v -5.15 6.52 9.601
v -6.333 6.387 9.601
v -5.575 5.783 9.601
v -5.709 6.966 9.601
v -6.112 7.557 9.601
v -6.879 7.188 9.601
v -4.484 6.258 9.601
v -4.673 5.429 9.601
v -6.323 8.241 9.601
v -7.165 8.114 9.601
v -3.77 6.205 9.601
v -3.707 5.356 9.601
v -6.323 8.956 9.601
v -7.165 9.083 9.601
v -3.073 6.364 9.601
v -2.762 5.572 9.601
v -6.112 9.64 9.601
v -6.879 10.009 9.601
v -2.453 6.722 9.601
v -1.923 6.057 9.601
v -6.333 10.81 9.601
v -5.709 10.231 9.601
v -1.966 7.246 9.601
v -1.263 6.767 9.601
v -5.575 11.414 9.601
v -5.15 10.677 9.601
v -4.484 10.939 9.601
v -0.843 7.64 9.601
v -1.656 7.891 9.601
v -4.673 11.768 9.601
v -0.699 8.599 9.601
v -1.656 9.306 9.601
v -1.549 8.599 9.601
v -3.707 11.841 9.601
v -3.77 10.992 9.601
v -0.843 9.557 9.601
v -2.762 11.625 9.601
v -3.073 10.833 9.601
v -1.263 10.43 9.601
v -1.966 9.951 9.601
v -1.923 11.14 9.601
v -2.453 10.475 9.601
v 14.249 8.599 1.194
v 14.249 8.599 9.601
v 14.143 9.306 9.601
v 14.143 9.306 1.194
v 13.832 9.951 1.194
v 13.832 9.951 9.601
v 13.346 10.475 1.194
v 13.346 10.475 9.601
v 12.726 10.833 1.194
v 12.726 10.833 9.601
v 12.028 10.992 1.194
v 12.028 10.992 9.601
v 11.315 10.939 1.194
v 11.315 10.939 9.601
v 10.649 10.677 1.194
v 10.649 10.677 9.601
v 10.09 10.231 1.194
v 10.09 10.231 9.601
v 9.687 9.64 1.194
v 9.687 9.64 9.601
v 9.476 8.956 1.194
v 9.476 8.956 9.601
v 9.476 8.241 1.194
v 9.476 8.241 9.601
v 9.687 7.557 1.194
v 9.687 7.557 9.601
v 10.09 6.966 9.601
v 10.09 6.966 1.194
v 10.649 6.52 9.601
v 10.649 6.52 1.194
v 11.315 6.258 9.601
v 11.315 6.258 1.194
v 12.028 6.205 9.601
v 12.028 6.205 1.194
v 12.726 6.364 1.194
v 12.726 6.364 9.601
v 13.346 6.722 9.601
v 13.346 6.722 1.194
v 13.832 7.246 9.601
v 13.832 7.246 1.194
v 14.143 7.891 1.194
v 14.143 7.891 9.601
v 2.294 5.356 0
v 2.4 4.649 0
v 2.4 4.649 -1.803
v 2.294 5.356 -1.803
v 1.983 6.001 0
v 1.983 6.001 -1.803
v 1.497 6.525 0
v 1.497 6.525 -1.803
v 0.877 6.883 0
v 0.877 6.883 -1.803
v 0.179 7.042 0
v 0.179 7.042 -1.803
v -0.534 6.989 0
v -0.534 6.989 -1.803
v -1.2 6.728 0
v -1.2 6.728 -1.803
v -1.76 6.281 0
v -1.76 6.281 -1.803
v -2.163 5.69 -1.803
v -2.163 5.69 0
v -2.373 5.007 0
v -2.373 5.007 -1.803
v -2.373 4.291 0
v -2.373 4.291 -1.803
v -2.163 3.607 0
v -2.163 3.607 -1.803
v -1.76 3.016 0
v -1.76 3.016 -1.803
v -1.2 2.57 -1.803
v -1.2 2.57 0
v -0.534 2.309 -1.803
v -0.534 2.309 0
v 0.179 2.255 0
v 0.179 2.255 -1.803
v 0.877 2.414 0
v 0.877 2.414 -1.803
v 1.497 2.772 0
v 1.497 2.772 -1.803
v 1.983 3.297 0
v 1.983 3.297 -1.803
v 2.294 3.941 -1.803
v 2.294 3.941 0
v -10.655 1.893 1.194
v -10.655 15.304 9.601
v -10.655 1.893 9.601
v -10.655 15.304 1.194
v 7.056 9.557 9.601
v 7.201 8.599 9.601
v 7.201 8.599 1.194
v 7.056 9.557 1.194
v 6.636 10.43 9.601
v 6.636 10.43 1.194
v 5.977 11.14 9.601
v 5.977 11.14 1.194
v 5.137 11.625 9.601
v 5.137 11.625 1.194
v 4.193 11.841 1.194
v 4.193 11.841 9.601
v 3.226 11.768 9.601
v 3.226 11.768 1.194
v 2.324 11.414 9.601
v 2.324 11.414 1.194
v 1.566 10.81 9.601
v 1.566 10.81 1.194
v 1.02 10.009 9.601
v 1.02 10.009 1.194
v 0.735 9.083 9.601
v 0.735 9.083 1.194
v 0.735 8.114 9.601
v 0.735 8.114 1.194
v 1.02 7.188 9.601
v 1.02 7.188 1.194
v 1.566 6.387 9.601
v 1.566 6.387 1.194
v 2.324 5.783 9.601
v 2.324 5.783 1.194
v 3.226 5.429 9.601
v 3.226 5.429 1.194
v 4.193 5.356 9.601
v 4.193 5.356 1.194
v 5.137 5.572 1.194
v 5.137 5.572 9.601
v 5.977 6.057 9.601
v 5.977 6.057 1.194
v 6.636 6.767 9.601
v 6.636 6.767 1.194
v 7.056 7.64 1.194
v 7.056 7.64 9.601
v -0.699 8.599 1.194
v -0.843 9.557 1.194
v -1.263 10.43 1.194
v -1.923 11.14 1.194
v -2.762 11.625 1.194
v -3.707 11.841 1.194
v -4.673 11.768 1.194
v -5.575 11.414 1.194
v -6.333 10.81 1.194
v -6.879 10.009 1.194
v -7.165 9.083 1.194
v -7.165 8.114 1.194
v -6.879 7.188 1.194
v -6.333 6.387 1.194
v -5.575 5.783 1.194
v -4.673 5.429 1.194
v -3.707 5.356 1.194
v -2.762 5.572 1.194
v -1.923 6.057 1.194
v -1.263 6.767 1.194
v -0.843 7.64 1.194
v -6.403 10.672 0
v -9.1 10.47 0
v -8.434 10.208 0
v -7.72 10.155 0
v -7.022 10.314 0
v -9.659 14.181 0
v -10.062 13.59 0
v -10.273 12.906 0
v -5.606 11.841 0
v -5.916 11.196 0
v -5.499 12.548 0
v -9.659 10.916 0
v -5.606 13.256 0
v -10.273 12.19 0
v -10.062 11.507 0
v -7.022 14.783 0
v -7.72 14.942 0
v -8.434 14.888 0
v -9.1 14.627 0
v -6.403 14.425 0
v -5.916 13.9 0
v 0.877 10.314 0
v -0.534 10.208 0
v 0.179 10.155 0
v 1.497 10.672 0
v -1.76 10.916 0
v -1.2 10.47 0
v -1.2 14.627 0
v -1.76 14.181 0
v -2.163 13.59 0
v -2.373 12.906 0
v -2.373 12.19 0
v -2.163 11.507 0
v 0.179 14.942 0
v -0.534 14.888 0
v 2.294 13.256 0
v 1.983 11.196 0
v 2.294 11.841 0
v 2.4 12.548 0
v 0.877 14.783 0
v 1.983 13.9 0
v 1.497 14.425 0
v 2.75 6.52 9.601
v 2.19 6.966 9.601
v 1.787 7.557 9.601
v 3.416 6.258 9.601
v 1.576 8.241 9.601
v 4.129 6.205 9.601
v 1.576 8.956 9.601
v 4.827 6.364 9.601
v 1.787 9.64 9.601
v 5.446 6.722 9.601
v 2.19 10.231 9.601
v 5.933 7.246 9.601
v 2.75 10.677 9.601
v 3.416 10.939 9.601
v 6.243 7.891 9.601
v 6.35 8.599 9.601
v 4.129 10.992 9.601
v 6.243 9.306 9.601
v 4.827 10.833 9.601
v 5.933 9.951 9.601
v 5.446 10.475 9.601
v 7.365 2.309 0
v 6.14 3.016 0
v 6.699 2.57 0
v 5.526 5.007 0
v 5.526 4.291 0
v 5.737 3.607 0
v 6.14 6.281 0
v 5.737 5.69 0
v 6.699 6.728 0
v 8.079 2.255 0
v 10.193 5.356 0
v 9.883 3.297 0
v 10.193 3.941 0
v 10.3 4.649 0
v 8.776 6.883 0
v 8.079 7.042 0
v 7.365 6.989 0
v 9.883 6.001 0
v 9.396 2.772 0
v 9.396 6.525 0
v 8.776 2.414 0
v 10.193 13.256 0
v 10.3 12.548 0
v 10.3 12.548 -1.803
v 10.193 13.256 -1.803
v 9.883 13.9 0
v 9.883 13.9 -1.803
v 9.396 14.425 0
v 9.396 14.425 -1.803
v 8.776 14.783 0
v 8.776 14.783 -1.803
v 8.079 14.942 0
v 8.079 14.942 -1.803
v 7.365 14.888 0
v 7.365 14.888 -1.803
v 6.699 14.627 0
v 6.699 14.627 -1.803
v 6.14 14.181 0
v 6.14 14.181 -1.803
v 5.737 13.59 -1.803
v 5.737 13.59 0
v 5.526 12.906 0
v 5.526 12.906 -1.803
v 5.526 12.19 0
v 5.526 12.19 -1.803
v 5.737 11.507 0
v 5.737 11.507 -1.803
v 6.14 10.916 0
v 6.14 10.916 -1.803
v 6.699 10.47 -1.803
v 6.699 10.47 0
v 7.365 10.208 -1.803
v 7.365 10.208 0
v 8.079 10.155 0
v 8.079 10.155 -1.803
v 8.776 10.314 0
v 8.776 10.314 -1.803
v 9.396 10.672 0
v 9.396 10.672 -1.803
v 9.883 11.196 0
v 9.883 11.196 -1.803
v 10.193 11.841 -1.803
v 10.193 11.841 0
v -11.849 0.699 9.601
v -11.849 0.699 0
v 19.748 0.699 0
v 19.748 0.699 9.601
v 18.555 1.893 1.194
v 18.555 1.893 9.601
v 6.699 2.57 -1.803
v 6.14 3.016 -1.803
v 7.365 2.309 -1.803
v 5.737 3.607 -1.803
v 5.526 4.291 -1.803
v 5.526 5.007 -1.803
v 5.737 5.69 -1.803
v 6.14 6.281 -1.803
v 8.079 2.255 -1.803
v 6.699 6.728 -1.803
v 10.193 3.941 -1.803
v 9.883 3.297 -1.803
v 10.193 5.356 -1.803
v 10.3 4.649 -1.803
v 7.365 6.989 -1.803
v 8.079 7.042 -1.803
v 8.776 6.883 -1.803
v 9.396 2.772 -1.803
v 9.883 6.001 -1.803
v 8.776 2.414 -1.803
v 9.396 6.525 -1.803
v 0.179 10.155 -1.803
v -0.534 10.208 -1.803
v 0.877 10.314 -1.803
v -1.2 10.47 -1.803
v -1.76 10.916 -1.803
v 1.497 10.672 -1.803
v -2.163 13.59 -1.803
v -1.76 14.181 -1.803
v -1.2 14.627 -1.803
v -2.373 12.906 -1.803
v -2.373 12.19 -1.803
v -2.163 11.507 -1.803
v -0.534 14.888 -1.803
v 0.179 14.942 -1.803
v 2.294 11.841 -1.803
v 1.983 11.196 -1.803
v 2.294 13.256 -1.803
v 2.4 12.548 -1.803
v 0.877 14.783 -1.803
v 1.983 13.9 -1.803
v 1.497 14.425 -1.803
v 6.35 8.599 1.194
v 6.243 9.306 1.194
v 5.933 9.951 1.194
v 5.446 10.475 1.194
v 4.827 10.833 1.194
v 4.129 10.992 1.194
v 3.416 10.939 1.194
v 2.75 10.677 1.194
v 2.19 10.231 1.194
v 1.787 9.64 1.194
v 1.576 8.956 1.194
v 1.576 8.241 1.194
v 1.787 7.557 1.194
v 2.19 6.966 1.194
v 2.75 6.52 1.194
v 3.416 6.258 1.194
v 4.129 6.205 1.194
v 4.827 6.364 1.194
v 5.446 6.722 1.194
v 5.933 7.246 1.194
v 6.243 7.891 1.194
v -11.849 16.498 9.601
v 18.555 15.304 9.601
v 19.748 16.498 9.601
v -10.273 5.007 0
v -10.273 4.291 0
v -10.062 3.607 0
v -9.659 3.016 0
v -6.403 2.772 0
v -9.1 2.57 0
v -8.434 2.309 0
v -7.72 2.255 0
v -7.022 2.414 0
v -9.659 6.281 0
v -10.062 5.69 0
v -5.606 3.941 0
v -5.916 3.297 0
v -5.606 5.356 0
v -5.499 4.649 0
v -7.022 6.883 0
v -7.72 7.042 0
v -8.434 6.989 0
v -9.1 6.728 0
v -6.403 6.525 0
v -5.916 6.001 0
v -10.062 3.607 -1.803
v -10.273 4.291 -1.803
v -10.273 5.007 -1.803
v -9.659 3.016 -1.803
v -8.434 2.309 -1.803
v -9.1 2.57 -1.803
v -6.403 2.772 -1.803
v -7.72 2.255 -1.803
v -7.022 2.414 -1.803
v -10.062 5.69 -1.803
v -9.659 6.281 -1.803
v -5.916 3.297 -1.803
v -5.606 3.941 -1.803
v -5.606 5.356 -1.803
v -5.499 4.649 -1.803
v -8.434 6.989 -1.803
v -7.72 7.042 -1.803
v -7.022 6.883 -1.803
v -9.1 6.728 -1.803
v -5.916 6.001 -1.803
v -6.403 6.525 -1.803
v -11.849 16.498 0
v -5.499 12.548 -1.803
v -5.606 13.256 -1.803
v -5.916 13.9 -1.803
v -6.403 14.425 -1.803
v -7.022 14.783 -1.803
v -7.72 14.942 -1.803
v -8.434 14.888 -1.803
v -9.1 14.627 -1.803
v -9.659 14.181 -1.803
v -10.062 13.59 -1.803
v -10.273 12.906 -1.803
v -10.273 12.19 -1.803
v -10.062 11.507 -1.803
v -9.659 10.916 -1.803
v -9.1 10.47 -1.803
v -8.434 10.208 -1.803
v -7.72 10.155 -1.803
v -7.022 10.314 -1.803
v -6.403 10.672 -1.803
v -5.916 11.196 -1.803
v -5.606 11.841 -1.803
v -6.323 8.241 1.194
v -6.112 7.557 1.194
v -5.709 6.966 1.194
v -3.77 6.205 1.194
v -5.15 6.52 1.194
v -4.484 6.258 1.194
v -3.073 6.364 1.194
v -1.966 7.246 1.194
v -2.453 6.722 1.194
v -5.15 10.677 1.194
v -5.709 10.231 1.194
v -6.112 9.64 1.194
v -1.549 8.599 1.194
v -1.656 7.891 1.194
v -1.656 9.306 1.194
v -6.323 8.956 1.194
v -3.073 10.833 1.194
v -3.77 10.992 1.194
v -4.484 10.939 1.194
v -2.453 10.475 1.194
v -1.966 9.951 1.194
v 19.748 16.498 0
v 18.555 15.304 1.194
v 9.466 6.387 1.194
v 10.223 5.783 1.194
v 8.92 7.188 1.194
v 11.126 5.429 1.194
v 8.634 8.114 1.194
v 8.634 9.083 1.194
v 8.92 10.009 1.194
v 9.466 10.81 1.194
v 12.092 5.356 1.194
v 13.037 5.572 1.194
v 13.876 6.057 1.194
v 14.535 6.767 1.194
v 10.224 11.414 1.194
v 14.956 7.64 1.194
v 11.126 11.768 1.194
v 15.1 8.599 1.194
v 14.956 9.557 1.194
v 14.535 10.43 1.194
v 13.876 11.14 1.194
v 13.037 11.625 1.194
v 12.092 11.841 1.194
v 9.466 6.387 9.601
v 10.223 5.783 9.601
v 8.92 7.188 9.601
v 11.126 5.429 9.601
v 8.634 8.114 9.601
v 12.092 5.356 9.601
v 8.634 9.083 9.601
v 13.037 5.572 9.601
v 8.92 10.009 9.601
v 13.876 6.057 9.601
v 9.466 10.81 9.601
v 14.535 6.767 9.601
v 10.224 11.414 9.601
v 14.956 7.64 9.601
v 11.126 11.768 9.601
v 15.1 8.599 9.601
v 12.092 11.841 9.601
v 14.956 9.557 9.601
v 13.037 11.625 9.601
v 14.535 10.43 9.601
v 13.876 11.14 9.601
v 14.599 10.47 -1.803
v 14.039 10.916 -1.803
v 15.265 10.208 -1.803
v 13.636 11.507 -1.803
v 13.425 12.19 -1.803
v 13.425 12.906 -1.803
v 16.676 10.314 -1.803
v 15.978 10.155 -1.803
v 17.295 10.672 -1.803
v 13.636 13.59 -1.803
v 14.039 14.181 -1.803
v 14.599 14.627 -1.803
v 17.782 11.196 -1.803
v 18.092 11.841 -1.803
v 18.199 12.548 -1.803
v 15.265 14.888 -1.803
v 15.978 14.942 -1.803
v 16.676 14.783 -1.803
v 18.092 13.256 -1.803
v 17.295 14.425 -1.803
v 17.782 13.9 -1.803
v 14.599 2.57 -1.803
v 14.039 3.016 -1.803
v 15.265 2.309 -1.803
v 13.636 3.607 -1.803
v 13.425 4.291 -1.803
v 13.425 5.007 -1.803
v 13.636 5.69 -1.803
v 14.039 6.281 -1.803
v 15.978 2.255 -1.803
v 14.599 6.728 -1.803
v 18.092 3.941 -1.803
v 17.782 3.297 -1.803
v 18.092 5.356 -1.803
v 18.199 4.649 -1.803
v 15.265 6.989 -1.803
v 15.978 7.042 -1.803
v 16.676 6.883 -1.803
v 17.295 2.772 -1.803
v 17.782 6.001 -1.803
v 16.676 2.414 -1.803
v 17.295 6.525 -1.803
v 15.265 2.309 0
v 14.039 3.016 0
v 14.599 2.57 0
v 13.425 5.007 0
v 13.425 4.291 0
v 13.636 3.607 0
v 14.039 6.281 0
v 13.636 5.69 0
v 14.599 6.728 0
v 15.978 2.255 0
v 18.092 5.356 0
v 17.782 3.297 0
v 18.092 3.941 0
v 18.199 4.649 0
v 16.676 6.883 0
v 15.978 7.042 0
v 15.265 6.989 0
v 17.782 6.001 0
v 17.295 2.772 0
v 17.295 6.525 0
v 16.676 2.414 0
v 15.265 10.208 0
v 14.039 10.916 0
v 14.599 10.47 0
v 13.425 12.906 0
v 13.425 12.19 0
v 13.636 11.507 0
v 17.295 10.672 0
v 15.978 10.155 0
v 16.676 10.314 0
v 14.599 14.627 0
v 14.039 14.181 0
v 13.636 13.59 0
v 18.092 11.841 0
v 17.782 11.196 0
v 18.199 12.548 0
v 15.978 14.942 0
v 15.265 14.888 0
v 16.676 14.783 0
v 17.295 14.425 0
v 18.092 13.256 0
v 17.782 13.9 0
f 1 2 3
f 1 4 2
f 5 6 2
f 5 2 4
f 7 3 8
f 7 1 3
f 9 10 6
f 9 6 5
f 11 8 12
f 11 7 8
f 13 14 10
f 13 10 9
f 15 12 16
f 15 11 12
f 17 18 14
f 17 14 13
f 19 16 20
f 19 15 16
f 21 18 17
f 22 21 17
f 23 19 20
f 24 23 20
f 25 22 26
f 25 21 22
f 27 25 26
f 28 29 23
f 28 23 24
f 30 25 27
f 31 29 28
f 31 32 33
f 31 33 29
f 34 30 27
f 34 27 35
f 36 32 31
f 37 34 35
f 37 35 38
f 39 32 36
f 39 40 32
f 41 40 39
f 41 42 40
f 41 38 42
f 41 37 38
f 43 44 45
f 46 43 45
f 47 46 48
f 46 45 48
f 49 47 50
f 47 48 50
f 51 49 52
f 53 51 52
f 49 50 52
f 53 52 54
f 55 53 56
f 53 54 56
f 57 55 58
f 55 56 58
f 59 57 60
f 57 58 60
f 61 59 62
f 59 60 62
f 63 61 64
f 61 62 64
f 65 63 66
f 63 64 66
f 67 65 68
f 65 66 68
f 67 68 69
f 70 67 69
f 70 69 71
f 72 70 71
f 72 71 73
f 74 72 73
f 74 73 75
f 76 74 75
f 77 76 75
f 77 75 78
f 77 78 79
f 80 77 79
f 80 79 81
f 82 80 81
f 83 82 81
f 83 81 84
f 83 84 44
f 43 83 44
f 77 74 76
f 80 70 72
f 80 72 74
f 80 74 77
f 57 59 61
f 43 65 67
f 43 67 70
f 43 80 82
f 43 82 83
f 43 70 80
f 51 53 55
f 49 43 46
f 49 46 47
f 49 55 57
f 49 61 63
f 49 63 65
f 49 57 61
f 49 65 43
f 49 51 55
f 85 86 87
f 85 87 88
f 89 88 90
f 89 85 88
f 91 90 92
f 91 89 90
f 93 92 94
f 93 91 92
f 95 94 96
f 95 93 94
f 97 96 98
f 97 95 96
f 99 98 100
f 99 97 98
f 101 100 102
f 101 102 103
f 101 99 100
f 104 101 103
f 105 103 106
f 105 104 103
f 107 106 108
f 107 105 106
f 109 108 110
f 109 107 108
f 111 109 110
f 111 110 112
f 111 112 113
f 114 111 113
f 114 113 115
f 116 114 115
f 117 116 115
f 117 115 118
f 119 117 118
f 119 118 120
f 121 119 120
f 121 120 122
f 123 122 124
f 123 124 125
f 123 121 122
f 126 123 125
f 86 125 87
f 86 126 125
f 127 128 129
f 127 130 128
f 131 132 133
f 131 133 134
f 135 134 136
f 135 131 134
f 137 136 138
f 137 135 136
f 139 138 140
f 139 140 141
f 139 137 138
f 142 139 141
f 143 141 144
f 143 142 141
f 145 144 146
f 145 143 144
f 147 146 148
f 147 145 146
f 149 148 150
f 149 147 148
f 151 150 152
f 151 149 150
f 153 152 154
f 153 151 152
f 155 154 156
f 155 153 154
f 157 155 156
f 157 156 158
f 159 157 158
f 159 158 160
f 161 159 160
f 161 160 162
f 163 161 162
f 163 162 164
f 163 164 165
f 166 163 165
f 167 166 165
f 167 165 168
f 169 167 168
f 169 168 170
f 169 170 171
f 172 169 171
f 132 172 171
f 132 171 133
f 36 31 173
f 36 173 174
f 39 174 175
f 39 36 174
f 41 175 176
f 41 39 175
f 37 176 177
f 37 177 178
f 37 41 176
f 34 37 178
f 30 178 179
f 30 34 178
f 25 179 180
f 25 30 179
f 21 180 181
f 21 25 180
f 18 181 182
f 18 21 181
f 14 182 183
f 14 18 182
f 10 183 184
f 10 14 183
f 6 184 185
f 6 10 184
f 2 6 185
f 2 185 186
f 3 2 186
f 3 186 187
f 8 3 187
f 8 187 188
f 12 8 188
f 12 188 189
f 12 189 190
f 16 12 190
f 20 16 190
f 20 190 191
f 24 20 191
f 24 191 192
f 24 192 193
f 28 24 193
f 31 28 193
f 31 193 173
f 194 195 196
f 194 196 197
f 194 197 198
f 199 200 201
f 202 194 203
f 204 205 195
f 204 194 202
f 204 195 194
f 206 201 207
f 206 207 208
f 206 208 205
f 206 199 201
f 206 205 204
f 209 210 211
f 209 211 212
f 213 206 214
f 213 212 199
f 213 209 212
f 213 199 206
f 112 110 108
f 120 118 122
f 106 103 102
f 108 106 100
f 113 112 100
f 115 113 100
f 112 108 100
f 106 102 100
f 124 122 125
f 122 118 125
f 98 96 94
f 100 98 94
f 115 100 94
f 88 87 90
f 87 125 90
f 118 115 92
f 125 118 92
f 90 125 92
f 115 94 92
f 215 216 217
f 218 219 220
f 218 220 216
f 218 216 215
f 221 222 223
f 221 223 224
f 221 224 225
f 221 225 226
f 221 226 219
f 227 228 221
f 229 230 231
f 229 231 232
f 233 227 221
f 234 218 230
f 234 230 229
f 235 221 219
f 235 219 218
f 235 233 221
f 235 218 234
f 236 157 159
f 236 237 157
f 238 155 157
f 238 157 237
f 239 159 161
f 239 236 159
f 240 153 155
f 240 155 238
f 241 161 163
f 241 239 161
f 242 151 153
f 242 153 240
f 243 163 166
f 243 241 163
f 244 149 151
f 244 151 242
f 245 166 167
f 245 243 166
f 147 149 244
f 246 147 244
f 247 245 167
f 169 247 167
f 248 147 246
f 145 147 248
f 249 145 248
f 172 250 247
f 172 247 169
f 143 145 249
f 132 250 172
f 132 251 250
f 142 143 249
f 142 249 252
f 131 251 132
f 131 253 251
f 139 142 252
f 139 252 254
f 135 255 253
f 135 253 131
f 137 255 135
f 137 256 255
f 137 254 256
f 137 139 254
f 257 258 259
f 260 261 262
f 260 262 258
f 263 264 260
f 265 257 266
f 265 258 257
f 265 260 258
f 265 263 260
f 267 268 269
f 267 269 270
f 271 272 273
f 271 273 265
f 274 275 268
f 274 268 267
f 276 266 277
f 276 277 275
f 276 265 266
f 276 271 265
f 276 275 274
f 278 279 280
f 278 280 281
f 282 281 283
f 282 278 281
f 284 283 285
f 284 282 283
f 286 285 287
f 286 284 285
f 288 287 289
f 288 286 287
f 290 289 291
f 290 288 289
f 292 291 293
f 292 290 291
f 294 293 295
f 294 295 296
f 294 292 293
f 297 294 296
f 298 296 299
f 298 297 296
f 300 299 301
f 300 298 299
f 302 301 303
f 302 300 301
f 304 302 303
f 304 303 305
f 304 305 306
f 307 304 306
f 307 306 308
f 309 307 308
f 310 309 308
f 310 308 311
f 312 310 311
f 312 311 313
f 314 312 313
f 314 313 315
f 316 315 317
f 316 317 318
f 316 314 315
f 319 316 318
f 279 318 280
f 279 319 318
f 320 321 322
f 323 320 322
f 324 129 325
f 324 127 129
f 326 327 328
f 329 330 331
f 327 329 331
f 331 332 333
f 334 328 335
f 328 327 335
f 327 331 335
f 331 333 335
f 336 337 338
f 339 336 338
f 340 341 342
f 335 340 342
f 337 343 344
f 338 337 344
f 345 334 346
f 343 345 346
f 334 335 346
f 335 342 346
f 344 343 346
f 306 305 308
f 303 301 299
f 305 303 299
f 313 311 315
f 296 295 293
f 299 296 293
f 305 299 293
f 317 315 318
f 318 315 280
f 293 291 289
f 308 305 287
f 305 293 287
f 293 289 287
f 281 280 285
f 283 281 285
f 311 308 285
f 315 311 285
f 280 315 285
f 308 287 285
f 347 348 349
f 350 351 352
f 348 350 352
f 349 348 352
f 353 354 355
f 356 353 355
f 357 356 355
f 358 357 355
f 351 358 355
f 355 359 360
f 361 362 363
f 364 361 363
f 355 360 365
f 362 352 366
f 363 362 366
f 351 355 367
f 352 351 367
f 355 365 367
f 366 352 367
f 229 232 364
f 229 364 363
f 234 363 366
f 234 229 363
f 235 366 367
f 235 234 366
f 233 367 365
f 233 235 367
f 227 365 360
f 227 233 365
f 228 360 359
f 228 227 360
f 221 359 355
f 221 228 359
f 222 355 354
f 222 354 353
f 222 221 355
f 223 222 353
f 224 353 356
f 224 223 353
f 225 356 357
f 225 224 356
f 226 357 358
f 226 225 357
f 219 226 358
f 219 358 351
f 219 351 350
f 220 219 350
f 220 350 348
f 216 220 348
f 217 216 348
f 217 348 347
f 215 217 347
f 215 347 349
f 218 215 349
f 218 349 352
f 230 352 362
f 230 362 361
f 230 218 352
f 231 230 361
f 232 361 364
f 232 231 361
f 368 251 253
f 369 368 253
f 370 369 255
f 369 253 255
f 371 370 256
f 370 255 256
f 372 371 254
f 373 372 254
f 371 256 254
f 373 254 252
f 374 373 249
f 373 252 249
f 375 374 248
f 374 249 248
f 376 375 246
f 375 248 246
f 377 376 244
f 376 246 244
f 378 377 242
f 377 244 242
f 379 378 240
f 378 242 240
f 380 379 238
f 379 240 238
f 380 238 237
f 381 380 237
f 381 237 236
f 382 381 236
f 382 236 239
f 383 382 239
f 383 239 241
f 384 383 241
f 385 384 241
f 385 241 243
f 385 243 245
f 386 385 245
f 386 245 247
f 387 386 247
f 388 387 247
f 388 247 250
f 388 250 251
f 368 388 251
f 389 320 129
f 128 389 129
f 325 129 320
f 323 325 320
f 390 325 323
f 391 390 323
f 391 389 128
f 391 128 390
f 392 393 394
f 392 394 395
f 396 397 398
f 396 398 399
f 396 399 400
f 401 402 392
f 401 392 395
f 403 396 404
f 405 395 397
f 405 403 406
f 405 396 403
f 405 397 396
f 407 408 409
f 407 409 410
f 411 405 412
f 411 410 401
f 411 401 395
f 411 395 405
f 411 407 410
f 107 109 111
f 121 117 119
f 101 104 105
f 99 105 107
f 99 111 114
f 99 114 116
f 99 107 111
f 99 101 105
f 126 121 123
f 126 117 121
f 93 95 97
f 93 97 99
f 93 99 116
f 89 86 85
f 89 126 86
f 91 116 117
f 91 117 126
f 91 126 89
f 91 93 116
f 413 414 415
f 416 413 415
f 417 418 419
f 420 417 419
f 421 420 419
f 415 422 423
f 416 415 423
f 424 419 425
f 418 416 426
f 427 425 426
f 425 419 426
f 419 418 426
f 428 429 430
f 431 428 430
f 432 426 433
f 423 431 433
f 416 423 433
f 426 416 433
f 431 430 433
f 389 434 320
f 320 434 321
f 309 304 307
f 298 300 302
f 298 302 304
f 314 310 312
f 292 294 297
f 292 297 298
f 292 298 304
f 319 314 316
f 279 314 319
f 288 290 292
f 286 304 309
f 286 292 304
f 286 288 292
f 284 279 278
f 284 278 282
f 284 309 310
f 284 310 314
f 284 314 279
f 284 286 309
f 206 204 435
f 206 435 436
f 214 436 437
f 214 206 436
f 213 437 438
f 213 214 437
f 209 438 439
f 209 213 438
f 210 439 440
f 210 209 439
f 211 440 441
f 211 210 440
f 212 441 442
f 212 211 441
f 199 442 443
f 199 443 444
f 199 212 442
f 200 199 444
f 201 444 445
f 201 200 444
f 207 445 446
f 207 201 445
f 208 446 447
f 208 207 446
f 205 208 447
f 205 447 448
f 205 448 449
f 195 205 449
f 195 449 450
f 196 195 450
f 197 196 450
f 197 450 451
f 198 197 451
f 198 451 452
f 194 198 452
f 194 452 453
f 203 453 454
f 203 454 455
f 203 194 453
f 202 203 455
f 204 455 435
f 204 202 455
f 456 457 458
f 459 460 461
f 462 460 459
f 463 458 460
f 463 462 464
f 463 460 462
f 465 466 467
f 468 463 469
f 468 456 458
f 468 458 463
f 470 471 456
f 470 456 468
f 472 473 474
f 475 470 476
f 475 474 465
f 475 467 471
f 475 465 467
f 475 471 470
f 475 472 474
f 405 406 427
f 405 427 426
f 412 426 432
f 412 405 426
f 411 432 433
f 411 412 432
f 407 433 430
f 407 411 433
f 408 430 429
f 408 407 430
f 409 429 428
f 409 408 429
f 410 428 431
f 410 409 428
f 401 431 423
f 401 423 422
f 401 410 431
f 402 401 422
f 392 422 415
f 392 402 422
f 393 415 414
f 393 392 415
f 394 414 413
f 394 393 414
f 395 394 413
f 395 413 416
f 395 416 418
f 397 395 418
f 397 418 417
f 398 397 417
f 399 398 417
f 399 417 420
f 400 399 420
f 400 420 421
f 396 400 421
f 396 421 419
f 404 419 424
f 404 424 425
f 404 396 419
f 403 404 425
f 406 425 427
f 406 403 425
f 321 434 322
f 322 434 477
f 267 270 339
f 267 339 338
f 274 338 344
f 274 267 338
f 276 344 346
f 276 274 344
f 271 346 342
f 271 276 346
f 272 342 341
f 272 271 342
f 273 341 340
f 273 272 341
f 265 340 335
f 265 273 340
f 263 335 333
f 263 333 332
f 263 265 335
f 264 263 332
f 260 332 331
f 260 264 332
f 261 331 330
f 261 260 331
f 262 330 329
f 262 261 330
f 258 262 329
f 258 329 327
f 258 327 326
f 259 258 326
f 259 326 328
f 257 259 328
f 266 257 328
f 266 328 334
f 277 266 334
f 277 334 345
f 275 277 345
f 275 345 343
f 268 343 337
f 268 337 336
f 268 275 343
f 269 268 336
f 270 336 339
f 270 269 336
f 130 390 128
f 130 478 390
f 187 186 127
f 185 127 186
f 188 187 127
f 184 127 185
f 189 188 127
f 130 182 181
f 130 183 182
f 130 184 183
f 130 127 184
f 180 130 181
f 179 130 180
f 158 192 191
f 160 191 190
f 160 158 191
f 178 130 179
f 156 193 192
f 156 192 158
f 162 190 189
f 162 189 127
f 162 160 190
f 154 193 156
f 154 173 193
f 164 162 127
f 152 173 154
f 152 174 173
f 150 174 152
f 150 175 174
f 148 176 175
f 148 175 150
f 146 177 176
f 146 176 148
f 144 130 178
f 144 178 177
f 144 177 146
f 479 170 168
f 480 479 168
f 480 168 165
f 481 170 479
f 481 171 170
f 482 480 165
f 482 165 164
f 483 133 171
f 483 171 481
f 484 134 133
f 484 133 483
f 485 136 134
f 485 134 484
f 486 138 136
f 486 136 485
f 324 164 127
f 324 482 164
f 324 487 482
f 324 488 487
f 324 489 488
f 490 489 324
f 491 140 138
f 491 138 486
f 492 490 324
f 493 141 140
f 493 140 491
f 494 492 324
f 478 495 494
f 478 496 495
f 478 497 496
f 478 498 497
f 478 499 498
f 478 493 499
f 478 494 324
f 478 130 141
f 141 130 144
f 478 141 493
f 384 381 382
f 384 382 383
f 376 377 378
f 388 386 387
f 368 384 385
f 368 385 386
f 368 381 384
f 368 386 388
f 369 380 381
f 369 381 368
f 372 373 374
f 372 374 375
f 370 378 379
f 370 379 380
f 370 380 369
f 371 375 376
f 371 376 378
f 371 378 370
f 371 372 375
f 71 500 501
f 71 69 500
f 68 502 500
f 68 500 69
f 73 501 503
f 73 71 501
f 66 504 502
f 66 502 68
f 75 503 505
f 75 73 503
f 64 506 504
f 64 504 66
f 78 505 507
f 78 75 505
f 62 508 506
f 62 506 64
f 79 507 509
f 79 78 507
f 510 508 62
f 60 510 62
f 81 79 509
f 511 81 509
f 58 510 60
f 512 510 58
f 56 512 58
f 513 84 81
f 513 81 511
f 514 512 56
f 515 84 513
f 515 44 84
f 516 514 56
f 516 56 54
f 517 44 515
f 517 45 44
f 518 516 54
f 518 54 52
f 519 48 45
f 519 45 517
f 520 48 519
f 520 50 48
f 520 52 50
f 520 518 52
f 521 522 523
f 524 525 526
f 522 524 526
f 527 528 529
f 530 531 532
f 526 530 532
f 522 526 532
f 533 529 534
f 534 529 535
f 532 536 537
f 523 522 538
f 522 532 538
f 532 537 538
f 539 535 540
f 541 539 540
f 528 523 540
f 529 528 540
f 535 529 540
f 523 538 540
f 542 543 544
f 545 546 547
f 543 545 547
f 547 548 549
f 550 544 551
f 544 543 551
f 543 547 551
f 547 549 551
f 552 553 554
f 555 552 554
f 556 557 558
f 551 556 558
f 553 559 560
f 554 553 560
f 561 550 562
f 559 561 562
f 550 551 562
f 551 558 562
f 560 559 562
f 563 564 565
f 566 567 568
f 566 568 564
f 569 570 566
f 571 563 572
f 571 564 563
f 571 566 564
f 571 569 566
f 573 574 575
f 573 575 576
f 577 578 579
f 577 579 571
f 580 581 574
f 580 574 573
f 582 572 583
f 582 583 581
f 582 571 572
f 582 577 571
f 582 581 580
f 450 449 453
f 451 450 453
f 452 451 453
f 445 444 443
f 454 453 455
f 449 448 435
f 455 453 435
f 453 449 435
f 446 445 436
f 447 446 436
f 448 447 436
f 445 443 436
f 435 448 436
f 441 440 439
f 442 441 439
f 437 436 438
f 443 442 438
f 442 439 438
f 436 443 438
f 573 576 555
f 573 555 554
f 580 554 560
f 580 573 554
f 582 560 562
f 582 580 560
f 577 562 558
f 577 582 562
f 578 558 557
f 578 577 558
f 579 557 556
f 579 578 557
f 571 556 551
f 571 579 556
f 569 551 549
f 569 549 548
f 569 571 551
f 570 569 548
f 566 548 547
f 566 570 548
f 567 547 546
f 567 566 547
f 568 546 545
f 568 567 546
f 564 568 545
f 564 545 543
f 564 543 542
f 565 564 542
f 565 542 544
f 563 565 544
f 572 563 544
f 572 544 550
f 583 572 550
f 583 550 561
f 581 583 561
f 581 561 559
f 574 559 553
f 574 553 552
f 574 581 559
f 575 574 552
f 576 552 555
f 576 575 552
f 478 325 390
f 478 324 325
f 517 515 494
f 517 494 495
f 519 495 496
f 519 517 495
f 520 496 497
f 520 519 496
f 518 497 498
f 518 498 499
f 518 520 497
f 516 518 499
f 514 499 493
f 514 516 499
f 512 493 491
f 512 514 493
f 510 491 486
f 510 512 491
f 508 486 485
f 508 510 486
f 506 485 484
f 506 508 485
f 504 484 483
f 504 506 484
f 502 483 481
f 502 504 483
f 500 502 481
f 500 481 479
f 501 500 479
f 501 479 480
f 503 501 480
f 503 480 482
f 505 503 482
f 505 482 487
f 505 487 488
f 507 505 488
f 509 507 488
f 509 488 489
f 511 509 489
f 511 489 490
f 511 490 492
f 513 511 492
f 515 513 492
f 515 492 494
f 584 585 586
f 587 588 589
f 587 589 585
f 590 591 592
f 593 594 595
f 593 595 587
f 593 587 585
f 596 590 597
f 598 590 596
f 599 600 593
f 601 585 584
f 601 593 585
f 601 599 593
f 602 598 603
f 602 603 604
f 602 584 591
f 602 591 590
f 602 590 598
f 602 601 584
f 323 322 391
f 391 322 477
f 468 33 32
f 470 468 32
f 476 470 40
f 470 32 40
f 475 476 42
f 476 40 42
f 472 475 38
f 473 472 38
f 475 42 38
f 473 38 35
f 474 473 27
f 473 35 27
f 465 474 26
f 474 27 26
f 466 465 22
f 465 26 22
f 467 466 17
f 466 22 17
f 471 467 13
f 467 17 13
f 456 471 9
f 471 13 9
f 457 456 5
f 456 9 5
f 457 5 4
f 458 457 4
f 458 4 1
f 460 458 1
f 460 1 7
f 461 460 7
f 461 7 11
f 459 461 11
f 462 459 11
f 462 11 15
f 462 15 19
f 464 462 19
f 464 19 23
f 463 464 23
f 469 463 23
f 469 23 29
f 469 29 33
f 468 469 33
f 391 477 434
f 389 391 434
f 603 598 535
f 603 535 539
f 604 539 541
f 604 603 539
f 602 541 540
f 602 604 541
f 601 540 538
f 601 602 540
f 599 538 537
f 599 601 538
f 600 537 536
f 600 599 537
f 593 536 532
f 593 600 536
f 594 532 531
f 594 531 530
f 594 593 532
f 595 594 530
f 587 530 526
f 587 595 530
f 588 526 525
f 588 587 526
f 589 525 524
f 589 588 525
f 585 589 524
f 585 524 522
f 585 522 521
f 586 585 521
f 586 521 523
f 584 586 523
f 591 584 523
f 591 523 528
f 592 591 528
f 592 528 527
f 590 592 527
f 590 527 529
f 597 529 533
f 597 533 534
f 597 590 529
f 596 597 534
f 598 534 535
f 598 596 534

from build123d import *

# Parameters (mm, degrees)
F0_R     = 2.4003
F1_DEPTH = 9.6012
F2_DEPTH = 1.8034
F3_T     = -1.1938
F4_R     = 3.2512
F4_R_2   = 2.4003
F5_DEPTH = 9.6012


# Not quite as in the source:
# - a feature names something its author has since deleted; it is built from what else it names


with BuildPart() as f1:
    # F0 (on Top) → F1 (new body)
    with BuildSketch(Plane.XY):
        Polygon((-11.8491, 16.497923825), (-11.8491, 8.598523825), (-11.8491, 0.699123825), (-3.9497, 0.699123825), (3.9497, 0.699123825), (11.8491, 0.699123825), (19.7485, 0.699123825), (19.7485, 8.598523825), (19.7485, 16.497923825), (11.8491, 16.497923825), (3.9497, 16.497923825), (-3.9497, 16.497923825), align=None)
        with Locations((-7.8994, 4.648823825)):
            Circle(F0_R, mode=Mode.SUBTRACT)
        with Locations((0, 4.648823825)):
            Circle(F0_R, mode=Mode.SUBTRACT)
        with Locations((7.8994, 4.648823825)):
            Circle(F0_R, mode=Mode.SUBTRACT)
        with Locations((15.7988, 4.648823825)):
            Circle(F0_R, mode=Mode.SUBTRACT)
        with Locations((-7.8994, 12.548223825)):
            Circle(F0_R, mode=Mode.SUBTRACT)
        with Locations((0, 12.548223825)):
            Circle(F0_R, mode=Mode.SUBTRACT)
        with Locations((7.8994, 12.548223825)):
            Circle(F0_R, mode=Mode.SUBTRACT)
        with Locations((15.7988, 12.548223825)):
            Circle(F0_R, mode=Mode.SUBTRACT)
        with Locations((-7.8994, 4.648823825)):
            Circle(F0_R)
        with Locations((-7.8994, 12.548223825)):
            Circle(F0_R)
        with Locations((0, 4.648823825)):
            Circle(F0_R)
        with Locations((0, 12.548223825)):
            Circle(F0_R)
        with Locations((7.8994, 4.648823825)):
            Circle(F0_R)
        with Locations((15.7988, 4.648823825)):
            Circle(F0_R)
        with Locations((15.7988, 12.548223825)):
            Circle(F0_R)
        with Locations((7.8994, 12.548223825)):
            Circle(F0_R)
    extrude(amount=F1_DEPTH)

    # F3
    f3_openings = [f1.faces().sort_by_distance(p)[0] for p in [
        (3.9497, 8.598524, 9.6012),
    ]]
    offset(amount=F3_T, openings=f3_openings)

    # F4 (on face) → F5 (join)
    with BuildSketch(Plane.XY.offset(9.6012)):
        with Locations((-3.9497, 8.598523825)):
            Circle(F4_R)
        with Locations((-3.9497, 8.598523825)):
            Circle(F4_R_2, mode=Mode.SUBTRACT)
        with Locations((3.9497, 8.598523825)):
            Circle(F4_R)
        with Locations((3.9497, 8.598523825)):
            Circle(F4_R_2, mode=Mode.SUBTRACT)
        with Locations((11.8491, 8.598523825)):
            Circle(F4_R)
        with Locations((11.8491, 8.598523825)):
            Circle(F4_R_2, mode=Mode.SUBTRACT)
    extrude(amount=-F5_DEPTH)


with BuildPart() as f2:
    # F0 (on Top) → F2 (new body)
    with BuildSketch(Plane.XY):
        with Locations((-7.8994, 4.648823825)):
            Circle(F0_R)
    extrude(amount=-F2_DEPTH)


with BuildPart() as f2b:
    # F0 (on Top) → F2, piece 2 (new body)
    with BuildSketch(Plane.XY):
        with Locations((0, 4.648823825)):
            Circle(F0_R)
    extrude(amount=-F2_DEPTH)


with BuildPart() as f2c:
    # F0 (on Top) → F2, piece 3 (new body)
    with BuildSketch(Plane.XY):
        with Locations((0, 12.548223825)):
            Circle(F0_R)
    extrude(amount=-F2_DEPTH)


with BuildPart() as f2d:
    # F0 (on Top) → F2, piece 4 (new body)
    with BuildSketch(Plane.XY):
        with Locations((-7.8994, 12.548223825)):
            Circle(F0_R)
    extrude(amount=-F2_DEPTH)


with BuildPart() as f2e:
    # F0 (on Top) → F2, piece 5 (new body)
    with BuildSketch(Plane.XY):
        with Locations((7.8994, 4.648823825)):
            Circle(F0_R)
    extrude(amount=-F2_DEPTH)


with BuildPart() as f2f:
    # F0 (on Top) → F2, piece 6 (new body)
    with BuildSketch(Plane.XY):
        with Locations((7.8994, 12.548223825)):
            Circle(F0_R)
    extrude(amount=-F2_DEPTH)


with BuildPart() as f2g:
    # F0 (on Top) → F2, piece 7 (new body)
    with BuildSketch(Plane.XY):
        with Locations((15.7988, 4.648823825)):
            Circle(F0_R)
    extrude(amount=-F2_DEPTH)


with BuildPart() as f2h:
    # F0 (on Top) → F2, piece 8 (new body)
    with BuildSketch(Plane.XY):
        with Locations((15.7988, 12.548223825)):
            Circle(F0_R)
    extrude(amount=-F2_DEPTH)


solid = Compound([f1.part, f2.part, f2b.part, f2c.part, f2d.part, f2e.part, f2f.part, f2g.part, f2h.part])
